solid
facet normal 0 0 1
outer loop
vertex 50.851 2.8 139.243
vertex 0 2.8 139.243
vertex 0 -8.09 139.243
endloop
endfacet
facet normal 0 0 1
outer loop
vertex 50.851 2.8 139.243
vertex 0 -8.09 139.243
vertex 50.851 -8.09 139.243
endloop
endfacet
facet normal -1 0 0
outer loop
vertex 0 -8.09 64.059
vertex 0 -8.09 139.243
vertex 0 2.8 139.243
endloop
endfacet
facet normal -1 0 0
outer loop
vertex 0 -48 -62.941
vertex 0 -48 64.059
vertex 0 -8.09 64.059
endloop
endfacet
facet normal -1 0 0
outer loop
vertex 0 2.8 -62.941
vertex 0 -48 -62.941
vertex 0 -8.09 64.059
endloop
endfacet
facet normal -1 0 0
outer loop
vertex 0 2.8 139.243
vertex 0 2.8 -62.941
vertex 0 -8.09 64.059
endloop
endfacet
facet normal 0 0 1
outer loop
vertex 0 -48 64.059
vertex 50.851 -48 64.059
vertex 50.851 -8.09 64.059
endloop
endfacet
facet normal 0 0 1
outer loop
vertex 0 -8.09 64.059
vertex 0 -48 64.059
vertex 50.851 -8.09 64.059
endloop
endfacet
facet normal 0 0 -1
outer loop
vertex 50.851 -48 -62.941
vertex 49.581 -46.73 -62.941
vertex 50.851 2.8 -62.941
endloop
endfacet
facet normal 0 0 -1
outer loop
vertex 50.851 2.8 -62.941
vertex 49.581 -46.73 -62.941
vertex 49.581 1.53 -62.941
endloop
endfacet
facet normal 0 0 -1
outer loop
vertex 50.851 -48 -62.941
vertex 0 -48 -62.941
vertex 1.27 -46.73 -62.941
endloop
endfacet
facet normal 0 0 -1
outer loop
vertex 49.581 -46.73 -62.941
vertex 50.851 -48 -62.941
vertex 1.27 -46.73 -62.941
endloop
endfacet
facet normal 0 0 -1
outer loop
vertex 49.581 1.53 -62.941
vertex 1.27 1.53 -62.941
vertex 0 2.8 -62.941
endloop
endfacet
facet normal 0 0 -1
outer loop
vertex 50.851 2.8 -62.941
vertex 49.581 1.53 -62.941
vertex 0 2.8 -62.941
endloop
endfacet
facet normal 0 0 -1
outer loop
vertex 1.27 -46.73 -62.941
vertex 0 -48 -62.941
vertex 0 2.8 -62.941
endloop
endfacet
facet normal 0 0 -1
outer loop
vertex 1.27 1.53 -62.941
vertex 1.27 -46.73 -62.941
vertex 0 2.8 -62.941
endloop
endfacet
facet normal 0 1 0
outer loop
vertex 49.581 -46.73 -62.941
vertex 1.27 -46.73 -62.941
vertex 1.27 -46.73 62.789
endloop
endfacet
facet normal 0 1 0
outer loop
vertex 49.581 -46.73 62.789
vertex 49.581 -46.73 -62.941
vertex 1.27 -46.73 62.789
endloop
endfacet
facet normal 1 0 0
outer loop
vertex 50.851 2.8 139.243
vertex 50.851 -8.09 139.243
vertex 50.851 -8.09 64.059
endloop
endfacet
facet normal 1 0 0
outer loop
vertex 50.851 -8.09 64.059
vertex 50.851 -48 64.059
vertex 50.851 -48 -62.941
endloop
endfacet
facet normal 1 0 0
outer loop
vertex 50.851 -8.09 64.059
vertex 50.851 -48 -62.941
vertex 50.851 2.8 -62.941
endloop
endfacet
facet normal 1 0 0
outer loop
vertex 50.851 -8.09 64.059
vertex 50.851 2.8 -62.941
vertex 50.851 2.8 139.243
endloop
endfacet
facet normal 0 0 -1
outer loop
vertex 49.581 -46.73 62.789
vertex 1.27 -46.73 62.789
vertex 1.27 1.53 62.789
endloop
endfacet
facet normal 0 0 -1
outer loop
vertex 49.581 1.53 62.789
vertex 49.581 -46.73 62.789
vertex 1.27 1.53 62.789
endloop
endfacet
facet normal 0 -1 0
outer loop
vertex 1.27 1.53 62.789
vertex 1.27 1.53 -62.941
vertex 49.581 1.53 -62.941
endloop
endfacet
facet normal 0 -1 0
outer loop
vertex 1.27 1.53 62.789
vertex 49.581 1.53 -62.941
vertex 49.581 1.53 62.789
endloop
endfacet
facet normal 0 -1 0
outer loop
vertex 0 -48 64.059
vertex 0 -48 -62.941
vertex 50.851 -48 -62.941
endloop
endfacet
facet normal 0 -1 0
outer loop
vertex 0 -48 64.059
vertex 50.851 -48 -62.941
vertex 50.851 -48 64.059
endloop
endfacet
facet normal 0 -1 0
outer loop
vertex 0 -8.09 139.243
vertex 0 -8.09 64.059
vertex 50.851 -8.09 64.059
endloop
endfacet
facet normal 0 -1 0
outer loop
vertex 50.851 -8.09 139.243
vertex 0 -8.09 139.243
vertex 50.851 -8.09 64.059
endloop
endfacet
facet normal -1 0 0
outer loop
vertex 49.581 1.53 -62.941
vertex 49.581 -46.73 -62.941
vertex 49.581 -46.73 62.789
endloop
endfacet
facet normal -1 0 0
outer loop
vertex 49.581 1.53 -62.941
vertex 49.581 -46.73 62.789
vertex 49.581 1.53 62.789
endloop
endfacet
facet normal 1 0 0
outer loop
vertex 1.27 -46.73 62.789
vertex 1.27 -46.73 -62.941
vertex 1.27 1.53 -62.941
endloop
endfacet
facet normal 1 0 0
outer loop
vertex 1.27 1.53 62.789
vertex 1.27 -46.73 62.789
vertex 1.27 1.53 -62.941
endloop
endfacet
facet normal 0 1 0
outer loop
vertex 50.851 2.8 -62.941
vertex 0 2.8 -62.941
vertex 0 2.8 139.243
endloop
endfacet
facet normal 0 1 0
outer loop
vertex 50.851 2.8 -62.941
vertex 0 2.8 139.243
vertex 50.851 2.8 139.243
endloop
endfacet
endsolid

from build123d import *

# Parameters (mm, degrees)
F0_W     = 50.8
F0_H     = 127
F1_DEPTH = 50.8508
F2_T     = -1.27
F3_W     = 50.8508
F3_H     = 10.889844
F4_DEPTH = 75.184


with BuildPart() as f1:
    # F0 (on Right) → F1 (new body)
    with BuildSketch(Plane.YZ):
        with Locations((-22.600227, 0.559007)):
            Rectangle(F0_W, F0_H)
    extrude(amount=F1_DEPTH)

    # F2
    f2_openings = [f1.faces().sort_by_distance(p)[0] for p in [
        (25.4254, -22.600227, -62.940993),
    ]]
    offset(amount=F2_T, openings=f2_openings)

    # F3 (on face) → F4 (join)
    with BuildSketch(Plane.XY.offset(64.059007)):
        with Locations((25.4254, -2.645149)):
            Rectangle(F3_W, F3_H)
    extrude(amount=F4_DEPTH)


solid = f1.part
